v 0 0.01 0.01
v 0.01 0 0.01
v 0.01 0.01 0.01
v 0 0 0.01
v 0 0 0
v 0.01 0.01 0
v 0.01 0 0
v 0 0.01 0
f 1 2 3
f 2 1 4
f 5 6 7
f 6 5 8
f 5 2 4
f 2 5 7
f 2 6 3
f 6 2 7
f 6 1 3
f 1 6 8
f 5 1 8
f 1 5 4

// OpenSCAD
/***
 * @function ellipse_shape_policy
 * @brief Preserve analytical axes, physical radii and solver bounds across sampling densities.
 * Source: [`ellipse/shape_policy.scad`](ellipse/shape_policy.scad)
 */
include <../../src/ellipse/mate.scad>
for(e=[0,.62,.94],n=[120,240,480,960]) {
    axes=_cg_ellipse_axes(.8,34,e);
    shape=_cg_ellipse_shape(.8,34,e,n);
    expected=[for(i=[0:n-1]) _cg_ellipse_driver_point(axes[0],axes[1],360*i/n)];
    assert(shape[0]==expected,"ellipse analytical-axis polygon was rescaled");
    assert(shape[2]==axes[0]+.01 && shape[3]==3*axes[0],"ellipse analytical bounds changed");
    assert(abs(curve_gear_ellipse_centre_distance(.8,34,e,n)-_cg_ellipse_centre_distance(axes[0],axes[1],n))<1e-9);
    for(theta=[0,13,89,177,359])
        assert(shape[1](theta)==_cg_ellipse_radius(axes[0],axes[1],theta),"ellipse physical radius changed");
}
cube(.01);
